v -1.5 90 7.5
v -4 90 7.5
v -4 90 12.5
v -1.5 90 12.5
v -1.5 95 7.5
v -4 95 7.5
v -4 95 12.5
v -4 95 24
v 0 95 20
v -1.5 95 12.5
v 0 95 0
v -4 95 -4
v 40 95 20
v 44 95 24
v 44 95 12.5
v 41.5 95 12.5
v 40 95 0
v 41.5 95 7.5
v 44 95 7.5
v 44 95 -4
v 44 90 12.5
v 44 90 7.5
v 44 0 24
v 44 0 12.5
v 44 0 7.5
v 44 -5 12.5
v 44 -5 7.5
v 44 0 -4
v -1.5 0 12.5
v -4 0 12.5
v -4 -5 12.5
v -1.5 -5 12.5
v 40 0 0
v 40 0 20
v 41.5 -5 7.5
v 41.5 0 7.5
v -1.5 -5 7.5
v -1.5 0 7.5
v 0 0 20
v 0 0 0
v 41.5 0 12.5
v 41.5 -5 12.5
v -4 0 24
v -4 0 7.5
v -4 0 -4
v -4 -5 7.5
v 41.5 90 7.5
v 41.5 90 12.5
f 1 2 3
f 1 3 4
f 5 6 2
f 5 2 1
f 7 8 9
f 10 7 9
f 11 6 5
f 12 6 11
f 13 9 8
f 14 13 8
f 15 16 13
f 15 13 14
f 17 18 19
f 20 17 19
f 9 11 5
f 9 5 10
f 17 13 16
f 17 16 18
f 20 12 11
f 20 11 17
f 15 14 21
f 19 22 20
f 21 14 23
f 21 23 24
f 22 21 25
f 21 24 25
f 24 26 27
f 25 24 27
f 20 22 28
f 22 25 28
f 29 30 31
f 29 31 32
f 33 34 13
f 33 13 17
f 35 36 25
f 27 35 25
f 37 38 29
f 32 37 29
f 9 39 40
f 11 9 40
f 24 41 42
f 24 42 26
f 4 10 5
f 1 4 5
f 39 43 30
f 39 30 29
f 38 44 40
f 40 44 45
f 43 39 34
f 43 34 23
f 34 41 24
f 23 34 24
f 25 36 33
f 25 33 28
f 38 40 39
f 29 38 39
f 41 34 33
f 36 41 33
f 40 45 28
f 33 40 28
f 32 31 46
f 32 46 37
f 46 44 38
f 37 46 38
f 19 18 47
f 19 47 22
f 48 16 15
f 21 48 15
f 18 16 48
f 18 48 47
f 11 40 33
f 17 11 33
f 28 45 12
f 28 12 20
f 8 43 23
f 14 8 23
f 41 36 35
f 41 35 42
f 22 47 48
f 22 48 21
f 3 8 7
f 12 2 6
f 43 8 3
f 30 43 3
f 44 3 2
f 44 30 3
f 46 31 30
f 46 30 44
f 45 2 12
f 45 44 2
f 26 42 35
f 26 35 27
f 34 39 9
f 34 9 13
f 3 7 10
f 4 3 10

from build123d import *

# Parameters (mm, degrees)
SKETCH1_W           = 48
SKETCH1_H           = 28
SKETCH1_W_2         = 40
SKETCH1_H_2         = 20
BOSS_EXTRUDE1_DEPTH = 95
SKETCH2_W           = 2.5
SKETCH2_H           = 5
CUT_EXTRUDE1_DEPTH  = 5
SKETCH6_W           = 2.5
SKETCH6_H           = 5
BOSS_EXTRUDE3_DEPTH = 5


with BuildPart() as part:
    # Sketch1 → Boss-Extrude1 (new body)
    with BuildSketch(Plane(origin=(0, 0, 0), x_dir=(1, 0, 0), z_dir=(0, 1, 0))):
        with Locations((20, -10)):
            Rectangle(SKETCH1_W, SKETCH1_H)
        with Locations((20, -10)):
            Rectangle(SKETCH1_W_2, SKETCH1_H_2, mode=Mode.SUBTRACT)
    extrude(amount=BOSS_EXTRUDE1_DEPTH)

    # Sketch2 → Cut-Extrude1 (cut)
    with BuildSketch(Plane(origin=(0, 95, 0), x_dir=(1, 0, 0), z_dir=(0, 1, 0))):
        with Locations((-2.75, -10)):
            Rectangle(SKETCH2_W, SKETCH2_H)
        with Locations((42.75, -10)):
            Rectangle(SKETCH2_W, SKETCH2_H)
    extrude(amount=-CUT_EXTRUDE1_DEPTH, mode=Mode.SUBTRACT)

    # Sketch6 → Boss-Extrude3 (add)
    with BuildSketch(Plane.XZ):
        with Locations((-2.75, 10)):
            Rectangle(SKETCH6_W, SKETCH6_H)
        with Locations((42.75, 10)):
            Rectangle(SKETCH6_W, SKETCH6_H)
    extrude(amount=BOSS_EXTRUDE3_DEPTH)


solid = part.part
